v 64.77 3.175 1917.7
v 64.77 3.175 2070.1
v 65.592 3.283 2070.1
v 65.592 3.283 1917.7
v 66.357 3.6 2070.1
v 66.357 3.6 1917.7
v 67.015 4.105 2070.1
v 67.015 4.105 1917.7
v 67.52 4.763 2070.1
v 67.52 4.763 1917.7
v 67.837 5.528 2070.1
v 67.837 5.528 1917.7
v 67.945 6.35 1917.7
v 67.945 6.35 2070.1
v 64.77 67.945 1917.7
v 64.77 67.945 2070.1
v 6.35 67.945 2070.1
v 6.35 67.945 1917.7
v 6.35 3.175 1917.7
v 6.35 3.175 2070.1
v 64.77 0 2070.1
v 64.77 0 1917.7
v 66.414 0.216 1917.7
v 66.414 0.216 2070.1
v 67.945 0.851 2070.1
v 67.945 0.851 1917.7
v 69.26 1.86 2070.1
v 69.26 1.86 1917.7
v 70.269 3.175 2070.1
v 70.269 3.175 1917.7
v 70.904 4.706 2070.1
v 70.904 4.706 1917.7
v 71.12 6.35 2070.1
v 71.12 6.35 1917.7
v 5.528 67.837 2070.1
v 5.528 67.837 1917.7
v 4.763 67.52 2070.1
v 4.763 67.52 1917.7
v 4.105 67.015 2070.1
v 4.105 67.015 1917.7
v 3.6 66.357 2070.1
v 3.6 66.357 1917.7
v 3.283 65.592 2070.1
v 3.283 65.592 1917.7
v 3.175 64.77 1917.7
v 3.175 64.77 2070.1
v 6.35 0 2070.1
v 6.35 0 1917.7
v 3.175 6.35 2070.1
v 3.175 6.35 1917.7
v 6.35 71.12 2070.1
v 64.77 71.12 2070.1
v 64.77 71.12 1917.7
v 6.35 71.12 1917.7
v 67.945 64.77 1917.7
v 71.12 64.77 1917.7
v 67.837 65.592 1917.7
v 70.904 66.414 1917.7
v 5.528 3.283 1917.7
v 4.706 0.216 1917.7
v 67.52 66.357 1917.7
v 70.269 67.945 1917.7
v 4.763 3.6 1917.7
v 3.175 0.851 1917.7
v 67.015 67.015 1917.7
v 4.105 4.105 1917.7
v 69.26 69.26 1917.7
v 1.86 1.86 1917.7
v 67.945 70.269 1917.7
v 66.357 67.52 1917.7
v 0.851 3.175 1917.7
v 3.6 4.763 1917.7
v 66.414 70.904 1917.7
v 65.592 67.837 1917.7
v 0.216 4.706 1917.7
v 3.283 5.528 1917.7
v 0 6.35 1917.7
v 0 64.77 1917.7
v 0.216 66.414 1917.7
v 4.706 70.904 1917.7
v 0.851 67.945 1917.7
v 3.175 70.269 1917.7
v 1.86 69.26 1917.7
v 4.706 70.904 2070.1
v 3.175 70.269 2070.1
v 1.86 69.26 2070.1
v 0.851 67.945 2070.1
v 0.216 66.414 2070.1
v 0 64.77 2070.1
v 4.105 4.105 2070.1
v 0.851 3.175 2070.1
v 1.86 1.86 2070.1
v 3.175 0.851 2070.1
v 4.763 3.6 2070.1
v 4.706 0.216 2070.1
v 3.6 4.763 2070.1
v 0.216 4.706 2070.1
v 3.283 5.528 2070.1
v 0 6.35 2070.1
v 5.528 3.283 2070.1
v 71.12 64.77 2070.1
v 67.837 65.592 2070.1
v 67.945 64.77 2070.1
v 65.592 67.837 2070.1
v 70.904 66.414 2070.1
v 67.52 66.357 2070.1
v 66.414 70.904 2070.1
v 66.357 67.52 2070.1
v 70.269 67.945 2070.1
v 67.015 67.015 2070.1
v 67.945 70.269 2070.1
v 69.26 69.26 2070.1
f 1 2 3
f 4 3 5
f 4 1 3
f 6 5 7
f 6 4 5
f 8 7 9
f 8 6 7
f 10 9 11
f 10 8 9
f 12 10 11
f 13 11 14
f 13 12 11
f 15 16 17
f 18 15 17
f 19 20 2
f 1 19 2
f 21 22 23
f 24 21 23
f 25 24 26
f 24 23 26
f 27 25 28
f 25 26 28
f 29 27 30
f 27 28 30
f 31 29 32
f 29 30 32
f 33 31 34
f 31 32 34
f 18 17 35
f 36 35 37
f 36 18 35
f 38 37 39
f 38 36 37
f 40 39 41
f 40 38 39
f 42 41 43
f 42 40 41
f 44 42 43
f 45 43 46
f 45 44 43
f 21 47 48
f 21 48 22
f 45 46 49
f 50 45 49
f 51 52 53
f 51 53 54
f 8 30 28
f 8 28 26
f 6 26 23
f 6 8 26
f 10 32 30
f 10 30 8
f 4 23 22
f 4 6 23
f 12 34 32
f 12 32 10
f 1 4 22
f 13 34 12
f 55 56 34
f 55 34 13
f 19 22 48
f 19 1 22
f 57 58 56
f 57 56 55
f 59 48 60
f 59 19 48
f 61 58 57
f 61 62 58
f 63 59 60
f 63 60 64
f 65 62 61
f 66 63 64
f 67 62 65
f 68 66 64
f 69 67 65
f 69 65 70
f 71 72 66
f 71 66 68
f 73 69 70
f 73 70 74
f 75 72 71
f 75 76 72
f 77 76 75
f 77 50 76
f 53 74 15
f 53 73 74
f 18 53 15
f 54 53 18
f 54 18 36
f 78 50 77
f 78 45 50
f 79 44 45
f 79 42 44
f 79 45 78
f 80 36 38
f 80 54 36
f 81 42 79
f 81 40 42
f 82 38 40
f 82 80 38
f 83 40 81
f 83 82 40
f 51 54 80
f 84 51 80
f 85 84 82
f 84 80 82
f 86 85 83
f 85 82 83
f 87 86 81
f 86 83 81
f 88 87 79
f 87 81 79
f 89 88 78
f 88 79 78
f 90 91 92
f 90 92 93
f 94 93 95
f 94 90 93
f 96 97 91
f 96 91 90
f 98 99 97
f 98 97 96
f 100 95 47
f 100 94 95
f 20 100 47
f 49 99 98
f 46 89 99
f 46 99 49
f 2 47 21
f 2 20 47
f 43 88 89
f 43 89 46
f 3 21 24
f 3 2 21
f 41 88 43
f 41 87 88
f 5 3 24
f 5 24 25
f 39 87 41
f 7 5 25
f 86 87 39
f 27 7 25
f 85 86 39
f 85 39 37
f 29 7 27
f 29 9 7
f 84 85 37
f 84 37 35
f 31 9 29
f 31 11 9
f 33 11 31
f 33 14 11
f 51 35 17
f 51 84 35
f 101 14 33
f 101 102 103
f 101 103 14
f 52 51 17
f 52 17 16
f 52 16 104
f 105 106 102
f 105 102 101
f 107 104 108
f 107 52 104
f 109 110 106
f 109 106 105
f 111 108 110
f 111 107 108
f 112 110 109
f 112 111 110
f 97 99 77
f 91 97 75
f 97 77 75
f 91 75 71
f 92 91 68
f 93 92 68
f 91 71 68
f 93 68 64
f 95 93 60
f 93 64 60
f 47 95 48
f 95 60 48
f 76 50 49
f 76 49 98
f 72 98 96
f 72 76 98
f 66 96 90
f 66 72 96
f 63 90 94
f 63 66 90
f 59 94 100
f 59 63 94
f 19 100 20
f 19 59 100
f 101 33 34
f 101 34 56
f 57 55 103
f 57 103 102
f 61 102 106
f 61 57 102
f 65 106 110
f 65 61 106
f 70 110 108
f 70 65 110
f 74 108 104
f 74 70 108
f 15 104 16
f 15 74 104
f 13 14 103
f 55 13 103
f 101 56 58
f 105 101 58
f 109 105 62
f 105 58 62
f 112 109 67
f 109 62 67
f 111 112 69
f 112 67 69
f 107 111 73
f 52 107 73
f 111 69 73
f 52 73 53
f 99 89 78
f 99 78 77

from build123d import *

# Parameters (mm, degrees)
BOSS_EXTRUDE1_DEPTH = 2070.1
SKETCH2_R           = 6.35
CUT_EXTRUDE1_DEPTH  = 2073.54194621
SKETCH3_R           = 3.274297192
CUT_EXTRUDE2_DEPTH  = 2073.54194621
CUT_EXTRUDE3_REACH  = 2074.542
SKETCH4_R           = 1.905
CUT_EXTRUDE4_DEPTH  = 1917.7


with BuildPart() as part:
    # Sketch1 → Boss-Extrude1 (new body)
    with BuildSketch(Plane.XY):
        with BuildLine():
            Line((6.35, 0), (64.77, 0))
            ThreePointArc((64.77, 0), (69.260128061, 1.859871939), (71.12, 6.35))
            Line((71.12, 6.35), (71.12, 64.77))
            ThreePointArc((71.12, 64.77), (69.260128061, 69.260128061), (64.77, 71.12))
            Line((64.77, 71.12), (6.35, 71.12))
            ThreePointArc((6.35, 71.12), (1.859871939, 69.260128061), (0, 64.77))
            Line((0, 64.77), (0, 6.35))
            ThreePointArc((0, 6.35), (1.859871939, 1.859871939), (6.35, 0))
        make_face()
        with BuildLine():
            Line((6.35, 3.175), (64.77, 3.175))
            ThreePointArc((64.77, 3.175), (67.01506403, 4.10493597), (67.945, 6.35))
            Line((67.945, 6.35), (67.945, 64.77))
            ThreePointArc((67.945, 64.77), (67.01506403, 67.01506403), (64.77, 67.945))
            Line((64.77, 67.945), (6.35, 67.945))
            ThreePointArc((6.35, 67.945), (4.10493597, 67.01506403), (3.175, 64.77))
            Line((3.175, 64.77), (3.175, 6.35))
            ThreePointArc((3.175, 6.35), (4.10493597, 4.10493597), (6.35, 3.175))
        make_face(mode=Mode.SUBTRACT)
    extrude(amount=BOSS_EXTRUDE1_DEPTH)

    # Sketch2 → Cut-Extrude1 (cut, through all)
    with BuildSketch(Plane(origin=(0, 0, 0), x_dir=(1, 0, 0), z_dir=(0, 1, 0))):
        with Locations(Location((35.56, -101.6, 0), (0, 0, 90))):
            Circle(SKETCH2_R)
        with Locations(Location((35.56, -279.4, 0), (0, 0, 90))):
            Circle(SKETCH2_R)
    extrude(amount=CUT_EXTRUDE1_DEPTH, mode=Mode.SUBTRACT)

    # Sketch3 → Cut-Extrude2 (cut, through all)
    with BuildSketch(Plane.ZY):
        with Locations((12.7, 53.975)):
            Circle(SKETCH3_R)
        with Locations((12.7, 17.145)):
            Circle(SKETCH3_R)
        with Locations((63.5, 17.145)):
            Circle(SKETCH3_R)
        with Locations((63.5, 53.975)):
            Circle(SKETCH3_R)
    extrude(amount=-CUT_EXTRUDE2_DEPTH, mode=Mode.SUBTRACT)

    # Sketch4 → Cut-Extrude3 (cut, up to next)
    with BuildSketch(Plane(origin=(0, 71.12, 0), x_dir=(1, 0, 0), z_dir=(0, 1, 0)), mode=Mode.PRIVATE) as cut_extrude3_sk1:
        with Locations(Location((13.335, -1508.125, 0), (0, 0, 270))):
            Circle(SKETCH4_R)
    cut_extrude3_tool1 = extrude(cut_extrude3_sk1.sketch, amount=-CUT_EXTRUDE3_REACH, mode=Mode.PRIVATE) & part.part
    # Sketch4 → Cut-Extrude3 (cut, up to next)
    with BuildSketch(Plane(origin=(0, 71.12, 0), x_dir=(1, 0, 0), z_dir=(0, 1, 0)), mode=Mode.PRIVATE) as cut_extrude3_sk2:
        with Locations(Location((57.785, -1508.125, 0), (0, 0, 270))):
            Circle(SKETCH4_R)
    cut_extrude3_tool2 = extrude(cut_extrude3_sk2.sketch, amount=-CUT_EXTRUDE3_REACH, mode=Mode.PRIVATE) & part.part
    # Sketch4 → Cut-Extrude3 (cut, up to next)
    with BuildSketch(Plane(origin=(0, 71.12, 0), x_dir=(1, 0, 0), z_dir=(0, 1, 0)), mode=Mode.PRIVATE) as cut_extrude3_sk3:
        with Locations(Location((57.785, -1565.275, 0), (0, 0, 270))):
            Circle(SKETCH4_R)
    cut_extrude3_tool3 = extrude(cut_extrude3_sk3.sketch, amount=-CUT_EXTRUDE3_REACH, mode=Mode.PRIVATE) & part.part
    # Sketch4 → Cut-Extrude3 (cut, up to next)
    with BuildSketch(Plane(origin=(0, 71.12, 0), x_dir=(1, 0, 0), z_dir=(0, 1, 0)), mode=Mode.PRIVATE) as cut_extrude3_sk4:
        with Locations(Location((13.335, -1565.275, 0), (0, 0, 270))):
            Circle(SKETCH4_R)
    cut_extrude3_tool4 = extrude(cut_extrude3_sk4.sketch, amount=-CUT_EXTRUDE3_REACH, mode=Mode.PRIVATE) & part.part
    # Sketch4 → Cut-Extrude3 (cut, up to next)
    with BuildSketch(Plane(origin=(0, 71.12, 0), x_dir=(1, 0, 0), z_dir=(0, 1, 0)), mode=Mode.PRIVATE) as cut_extrude3_sk5:
        with Locations(Location((13.335, -1133.475, 0), (0, 0, 270))):
            Circle(SKETCH4_R)
    cut_extrude3_tool5 = extrude(cut_extrude3_sk5.sketch, amount=-CUT_EXTRUDE3_REACH, mode=Mode.PRIVATE) & part.part
    # Sketch4 → Cut-Extrude3 (cut, up to next)
    with BuildSketch(Plane(origin=(0, 71.12, 0), x_dir=(1, 0, 0), z_dir=(0, 1, 0)), mode=Mode.PRIVATE) as cut_extrude3_sk6:
        with Locations(Location((57.785, -1133.475, 0), (0, 0, 270))):
            Circle(SKETCH4_R)
    cut_extrude3_tool6 = extrude(cut_extrude3_sk6.sketch, amount=-CUT_EXTRUDE3_REACH, mode=Mode.PRIVATE) & part.part
    # Sketch4 → Cut-Extrude3 (cut, up to next)
    with BuildSketch(Plane(origin=(0, 71.12, 0), x_dir=(1, 0, 0), z_dir=(0, 1, 0)), mode=Mode.PRIVATE) as cut_extrude3_sk7:
        with Locations(Location((57.785, -1190.625, 0), (0, 0, 270))):
            Circle(SKETCH4_R)
    cut_extrude3_tool7 = extrude(cut_extrude3_sk7.sketch, amount=-CUT_EXTRUDE3_REACH, mode=Mode.PRIVATE) & part.part
    # Sketch4 → Cut-Extrude3 (cut, up to next)
    with BuildSketch(Plane(origin=(0, 71.12, 0), x_dir=(1, 0, 0), z_dir=(0, 1, 0)), mode=Mode.PRIVATE) as cut_extrude3_sk8:
        with Locations(Location((13.335, -1190.625, 0), (0, 0, 270))):
            Circle(SKETCH4_R)
    cut_extrude3_tool8 = extrude(cut_extrude3_sk8.sketch, amount=-CUT_EXTRUDE3_REACH, mode=Mode.PRIVATE) & part.part
    add(cut_extrude3_tool1.solids().sort_by_distance((13.335, 71.12, 1508.125))[0], mode=Mode.SUBTRACT)
    add(cut_extrude3_tool2.solids().sort_by_distance((57.785, 71.12, 1508.125))[0], mode=Mode.SUBTRACT)
    add(cut_extrude3_tool3.solids().sort_by_distance((57.785, 71.12, 1565.275))[0], mode=Mode.SUBTRACT)
    add(cut_extrude3_tool4.solids().sort_by_distance((13.335, 71.12, 1565.275))[0], mode=Mode.SUBTRACT)
    add(cut_extrude3_tool5.solids().sort_by_distance((13.335, 71.12, 1133.475))[0], mode=Mode.SUBTRACT)
    add(cut_extrude3_tool6.solids().sort_by_distance((57.785, 71.12, 1133.475))[0], mode=Mode.SUBTRACT)
    add(cut_extrude3_tool7.solids().sort_by_distance((57.785, 71.12, 1190.625))[0], mode=Mode.SUBTRACT)
    add(cut_extrude3_tool8.solids().sort_by_distance((13.335, 71.12, 1190.625))[0], mode=Mode.SUBTRACT)

    # Sketch5 → Cut-Extrude4 (cut)
    with BuildSketch(Plane(origin=(0, 0, 0), x_dir=(-1, 0, 0), z_dir=(0, 0, -1))):
        with BuildLine():
            Line((0, 6.35), (0, 64.77))
            ThreePointArc((0, 64.77), (-1.859871939, 69.260128061), (-6.35, 71.12))
            Line((-6.35, 71.12), (-64.77, 71.12))
            ThreePointArc((-64.77, 71.12), (-69.260128061, 69.260128061), (-71.12, 64.77))
            Line((-71.12, 64.77), (-71.12, 6.35))
            ThreePointArc((-71.12, 6.35), (-69.260128061, 1.859871939), (-64.77, 0))
            Line((-64.77, 0), (-6.35, 0))
            ThreePointArc((-6.35, 0), (-1.859871939, 1.859871939), (0, 6.35))
        make_face()
    extrude(amount=-CUT_EXTRUDE4_DEPTH, mode=Mode.SUBTRACT)


solid = part.part
